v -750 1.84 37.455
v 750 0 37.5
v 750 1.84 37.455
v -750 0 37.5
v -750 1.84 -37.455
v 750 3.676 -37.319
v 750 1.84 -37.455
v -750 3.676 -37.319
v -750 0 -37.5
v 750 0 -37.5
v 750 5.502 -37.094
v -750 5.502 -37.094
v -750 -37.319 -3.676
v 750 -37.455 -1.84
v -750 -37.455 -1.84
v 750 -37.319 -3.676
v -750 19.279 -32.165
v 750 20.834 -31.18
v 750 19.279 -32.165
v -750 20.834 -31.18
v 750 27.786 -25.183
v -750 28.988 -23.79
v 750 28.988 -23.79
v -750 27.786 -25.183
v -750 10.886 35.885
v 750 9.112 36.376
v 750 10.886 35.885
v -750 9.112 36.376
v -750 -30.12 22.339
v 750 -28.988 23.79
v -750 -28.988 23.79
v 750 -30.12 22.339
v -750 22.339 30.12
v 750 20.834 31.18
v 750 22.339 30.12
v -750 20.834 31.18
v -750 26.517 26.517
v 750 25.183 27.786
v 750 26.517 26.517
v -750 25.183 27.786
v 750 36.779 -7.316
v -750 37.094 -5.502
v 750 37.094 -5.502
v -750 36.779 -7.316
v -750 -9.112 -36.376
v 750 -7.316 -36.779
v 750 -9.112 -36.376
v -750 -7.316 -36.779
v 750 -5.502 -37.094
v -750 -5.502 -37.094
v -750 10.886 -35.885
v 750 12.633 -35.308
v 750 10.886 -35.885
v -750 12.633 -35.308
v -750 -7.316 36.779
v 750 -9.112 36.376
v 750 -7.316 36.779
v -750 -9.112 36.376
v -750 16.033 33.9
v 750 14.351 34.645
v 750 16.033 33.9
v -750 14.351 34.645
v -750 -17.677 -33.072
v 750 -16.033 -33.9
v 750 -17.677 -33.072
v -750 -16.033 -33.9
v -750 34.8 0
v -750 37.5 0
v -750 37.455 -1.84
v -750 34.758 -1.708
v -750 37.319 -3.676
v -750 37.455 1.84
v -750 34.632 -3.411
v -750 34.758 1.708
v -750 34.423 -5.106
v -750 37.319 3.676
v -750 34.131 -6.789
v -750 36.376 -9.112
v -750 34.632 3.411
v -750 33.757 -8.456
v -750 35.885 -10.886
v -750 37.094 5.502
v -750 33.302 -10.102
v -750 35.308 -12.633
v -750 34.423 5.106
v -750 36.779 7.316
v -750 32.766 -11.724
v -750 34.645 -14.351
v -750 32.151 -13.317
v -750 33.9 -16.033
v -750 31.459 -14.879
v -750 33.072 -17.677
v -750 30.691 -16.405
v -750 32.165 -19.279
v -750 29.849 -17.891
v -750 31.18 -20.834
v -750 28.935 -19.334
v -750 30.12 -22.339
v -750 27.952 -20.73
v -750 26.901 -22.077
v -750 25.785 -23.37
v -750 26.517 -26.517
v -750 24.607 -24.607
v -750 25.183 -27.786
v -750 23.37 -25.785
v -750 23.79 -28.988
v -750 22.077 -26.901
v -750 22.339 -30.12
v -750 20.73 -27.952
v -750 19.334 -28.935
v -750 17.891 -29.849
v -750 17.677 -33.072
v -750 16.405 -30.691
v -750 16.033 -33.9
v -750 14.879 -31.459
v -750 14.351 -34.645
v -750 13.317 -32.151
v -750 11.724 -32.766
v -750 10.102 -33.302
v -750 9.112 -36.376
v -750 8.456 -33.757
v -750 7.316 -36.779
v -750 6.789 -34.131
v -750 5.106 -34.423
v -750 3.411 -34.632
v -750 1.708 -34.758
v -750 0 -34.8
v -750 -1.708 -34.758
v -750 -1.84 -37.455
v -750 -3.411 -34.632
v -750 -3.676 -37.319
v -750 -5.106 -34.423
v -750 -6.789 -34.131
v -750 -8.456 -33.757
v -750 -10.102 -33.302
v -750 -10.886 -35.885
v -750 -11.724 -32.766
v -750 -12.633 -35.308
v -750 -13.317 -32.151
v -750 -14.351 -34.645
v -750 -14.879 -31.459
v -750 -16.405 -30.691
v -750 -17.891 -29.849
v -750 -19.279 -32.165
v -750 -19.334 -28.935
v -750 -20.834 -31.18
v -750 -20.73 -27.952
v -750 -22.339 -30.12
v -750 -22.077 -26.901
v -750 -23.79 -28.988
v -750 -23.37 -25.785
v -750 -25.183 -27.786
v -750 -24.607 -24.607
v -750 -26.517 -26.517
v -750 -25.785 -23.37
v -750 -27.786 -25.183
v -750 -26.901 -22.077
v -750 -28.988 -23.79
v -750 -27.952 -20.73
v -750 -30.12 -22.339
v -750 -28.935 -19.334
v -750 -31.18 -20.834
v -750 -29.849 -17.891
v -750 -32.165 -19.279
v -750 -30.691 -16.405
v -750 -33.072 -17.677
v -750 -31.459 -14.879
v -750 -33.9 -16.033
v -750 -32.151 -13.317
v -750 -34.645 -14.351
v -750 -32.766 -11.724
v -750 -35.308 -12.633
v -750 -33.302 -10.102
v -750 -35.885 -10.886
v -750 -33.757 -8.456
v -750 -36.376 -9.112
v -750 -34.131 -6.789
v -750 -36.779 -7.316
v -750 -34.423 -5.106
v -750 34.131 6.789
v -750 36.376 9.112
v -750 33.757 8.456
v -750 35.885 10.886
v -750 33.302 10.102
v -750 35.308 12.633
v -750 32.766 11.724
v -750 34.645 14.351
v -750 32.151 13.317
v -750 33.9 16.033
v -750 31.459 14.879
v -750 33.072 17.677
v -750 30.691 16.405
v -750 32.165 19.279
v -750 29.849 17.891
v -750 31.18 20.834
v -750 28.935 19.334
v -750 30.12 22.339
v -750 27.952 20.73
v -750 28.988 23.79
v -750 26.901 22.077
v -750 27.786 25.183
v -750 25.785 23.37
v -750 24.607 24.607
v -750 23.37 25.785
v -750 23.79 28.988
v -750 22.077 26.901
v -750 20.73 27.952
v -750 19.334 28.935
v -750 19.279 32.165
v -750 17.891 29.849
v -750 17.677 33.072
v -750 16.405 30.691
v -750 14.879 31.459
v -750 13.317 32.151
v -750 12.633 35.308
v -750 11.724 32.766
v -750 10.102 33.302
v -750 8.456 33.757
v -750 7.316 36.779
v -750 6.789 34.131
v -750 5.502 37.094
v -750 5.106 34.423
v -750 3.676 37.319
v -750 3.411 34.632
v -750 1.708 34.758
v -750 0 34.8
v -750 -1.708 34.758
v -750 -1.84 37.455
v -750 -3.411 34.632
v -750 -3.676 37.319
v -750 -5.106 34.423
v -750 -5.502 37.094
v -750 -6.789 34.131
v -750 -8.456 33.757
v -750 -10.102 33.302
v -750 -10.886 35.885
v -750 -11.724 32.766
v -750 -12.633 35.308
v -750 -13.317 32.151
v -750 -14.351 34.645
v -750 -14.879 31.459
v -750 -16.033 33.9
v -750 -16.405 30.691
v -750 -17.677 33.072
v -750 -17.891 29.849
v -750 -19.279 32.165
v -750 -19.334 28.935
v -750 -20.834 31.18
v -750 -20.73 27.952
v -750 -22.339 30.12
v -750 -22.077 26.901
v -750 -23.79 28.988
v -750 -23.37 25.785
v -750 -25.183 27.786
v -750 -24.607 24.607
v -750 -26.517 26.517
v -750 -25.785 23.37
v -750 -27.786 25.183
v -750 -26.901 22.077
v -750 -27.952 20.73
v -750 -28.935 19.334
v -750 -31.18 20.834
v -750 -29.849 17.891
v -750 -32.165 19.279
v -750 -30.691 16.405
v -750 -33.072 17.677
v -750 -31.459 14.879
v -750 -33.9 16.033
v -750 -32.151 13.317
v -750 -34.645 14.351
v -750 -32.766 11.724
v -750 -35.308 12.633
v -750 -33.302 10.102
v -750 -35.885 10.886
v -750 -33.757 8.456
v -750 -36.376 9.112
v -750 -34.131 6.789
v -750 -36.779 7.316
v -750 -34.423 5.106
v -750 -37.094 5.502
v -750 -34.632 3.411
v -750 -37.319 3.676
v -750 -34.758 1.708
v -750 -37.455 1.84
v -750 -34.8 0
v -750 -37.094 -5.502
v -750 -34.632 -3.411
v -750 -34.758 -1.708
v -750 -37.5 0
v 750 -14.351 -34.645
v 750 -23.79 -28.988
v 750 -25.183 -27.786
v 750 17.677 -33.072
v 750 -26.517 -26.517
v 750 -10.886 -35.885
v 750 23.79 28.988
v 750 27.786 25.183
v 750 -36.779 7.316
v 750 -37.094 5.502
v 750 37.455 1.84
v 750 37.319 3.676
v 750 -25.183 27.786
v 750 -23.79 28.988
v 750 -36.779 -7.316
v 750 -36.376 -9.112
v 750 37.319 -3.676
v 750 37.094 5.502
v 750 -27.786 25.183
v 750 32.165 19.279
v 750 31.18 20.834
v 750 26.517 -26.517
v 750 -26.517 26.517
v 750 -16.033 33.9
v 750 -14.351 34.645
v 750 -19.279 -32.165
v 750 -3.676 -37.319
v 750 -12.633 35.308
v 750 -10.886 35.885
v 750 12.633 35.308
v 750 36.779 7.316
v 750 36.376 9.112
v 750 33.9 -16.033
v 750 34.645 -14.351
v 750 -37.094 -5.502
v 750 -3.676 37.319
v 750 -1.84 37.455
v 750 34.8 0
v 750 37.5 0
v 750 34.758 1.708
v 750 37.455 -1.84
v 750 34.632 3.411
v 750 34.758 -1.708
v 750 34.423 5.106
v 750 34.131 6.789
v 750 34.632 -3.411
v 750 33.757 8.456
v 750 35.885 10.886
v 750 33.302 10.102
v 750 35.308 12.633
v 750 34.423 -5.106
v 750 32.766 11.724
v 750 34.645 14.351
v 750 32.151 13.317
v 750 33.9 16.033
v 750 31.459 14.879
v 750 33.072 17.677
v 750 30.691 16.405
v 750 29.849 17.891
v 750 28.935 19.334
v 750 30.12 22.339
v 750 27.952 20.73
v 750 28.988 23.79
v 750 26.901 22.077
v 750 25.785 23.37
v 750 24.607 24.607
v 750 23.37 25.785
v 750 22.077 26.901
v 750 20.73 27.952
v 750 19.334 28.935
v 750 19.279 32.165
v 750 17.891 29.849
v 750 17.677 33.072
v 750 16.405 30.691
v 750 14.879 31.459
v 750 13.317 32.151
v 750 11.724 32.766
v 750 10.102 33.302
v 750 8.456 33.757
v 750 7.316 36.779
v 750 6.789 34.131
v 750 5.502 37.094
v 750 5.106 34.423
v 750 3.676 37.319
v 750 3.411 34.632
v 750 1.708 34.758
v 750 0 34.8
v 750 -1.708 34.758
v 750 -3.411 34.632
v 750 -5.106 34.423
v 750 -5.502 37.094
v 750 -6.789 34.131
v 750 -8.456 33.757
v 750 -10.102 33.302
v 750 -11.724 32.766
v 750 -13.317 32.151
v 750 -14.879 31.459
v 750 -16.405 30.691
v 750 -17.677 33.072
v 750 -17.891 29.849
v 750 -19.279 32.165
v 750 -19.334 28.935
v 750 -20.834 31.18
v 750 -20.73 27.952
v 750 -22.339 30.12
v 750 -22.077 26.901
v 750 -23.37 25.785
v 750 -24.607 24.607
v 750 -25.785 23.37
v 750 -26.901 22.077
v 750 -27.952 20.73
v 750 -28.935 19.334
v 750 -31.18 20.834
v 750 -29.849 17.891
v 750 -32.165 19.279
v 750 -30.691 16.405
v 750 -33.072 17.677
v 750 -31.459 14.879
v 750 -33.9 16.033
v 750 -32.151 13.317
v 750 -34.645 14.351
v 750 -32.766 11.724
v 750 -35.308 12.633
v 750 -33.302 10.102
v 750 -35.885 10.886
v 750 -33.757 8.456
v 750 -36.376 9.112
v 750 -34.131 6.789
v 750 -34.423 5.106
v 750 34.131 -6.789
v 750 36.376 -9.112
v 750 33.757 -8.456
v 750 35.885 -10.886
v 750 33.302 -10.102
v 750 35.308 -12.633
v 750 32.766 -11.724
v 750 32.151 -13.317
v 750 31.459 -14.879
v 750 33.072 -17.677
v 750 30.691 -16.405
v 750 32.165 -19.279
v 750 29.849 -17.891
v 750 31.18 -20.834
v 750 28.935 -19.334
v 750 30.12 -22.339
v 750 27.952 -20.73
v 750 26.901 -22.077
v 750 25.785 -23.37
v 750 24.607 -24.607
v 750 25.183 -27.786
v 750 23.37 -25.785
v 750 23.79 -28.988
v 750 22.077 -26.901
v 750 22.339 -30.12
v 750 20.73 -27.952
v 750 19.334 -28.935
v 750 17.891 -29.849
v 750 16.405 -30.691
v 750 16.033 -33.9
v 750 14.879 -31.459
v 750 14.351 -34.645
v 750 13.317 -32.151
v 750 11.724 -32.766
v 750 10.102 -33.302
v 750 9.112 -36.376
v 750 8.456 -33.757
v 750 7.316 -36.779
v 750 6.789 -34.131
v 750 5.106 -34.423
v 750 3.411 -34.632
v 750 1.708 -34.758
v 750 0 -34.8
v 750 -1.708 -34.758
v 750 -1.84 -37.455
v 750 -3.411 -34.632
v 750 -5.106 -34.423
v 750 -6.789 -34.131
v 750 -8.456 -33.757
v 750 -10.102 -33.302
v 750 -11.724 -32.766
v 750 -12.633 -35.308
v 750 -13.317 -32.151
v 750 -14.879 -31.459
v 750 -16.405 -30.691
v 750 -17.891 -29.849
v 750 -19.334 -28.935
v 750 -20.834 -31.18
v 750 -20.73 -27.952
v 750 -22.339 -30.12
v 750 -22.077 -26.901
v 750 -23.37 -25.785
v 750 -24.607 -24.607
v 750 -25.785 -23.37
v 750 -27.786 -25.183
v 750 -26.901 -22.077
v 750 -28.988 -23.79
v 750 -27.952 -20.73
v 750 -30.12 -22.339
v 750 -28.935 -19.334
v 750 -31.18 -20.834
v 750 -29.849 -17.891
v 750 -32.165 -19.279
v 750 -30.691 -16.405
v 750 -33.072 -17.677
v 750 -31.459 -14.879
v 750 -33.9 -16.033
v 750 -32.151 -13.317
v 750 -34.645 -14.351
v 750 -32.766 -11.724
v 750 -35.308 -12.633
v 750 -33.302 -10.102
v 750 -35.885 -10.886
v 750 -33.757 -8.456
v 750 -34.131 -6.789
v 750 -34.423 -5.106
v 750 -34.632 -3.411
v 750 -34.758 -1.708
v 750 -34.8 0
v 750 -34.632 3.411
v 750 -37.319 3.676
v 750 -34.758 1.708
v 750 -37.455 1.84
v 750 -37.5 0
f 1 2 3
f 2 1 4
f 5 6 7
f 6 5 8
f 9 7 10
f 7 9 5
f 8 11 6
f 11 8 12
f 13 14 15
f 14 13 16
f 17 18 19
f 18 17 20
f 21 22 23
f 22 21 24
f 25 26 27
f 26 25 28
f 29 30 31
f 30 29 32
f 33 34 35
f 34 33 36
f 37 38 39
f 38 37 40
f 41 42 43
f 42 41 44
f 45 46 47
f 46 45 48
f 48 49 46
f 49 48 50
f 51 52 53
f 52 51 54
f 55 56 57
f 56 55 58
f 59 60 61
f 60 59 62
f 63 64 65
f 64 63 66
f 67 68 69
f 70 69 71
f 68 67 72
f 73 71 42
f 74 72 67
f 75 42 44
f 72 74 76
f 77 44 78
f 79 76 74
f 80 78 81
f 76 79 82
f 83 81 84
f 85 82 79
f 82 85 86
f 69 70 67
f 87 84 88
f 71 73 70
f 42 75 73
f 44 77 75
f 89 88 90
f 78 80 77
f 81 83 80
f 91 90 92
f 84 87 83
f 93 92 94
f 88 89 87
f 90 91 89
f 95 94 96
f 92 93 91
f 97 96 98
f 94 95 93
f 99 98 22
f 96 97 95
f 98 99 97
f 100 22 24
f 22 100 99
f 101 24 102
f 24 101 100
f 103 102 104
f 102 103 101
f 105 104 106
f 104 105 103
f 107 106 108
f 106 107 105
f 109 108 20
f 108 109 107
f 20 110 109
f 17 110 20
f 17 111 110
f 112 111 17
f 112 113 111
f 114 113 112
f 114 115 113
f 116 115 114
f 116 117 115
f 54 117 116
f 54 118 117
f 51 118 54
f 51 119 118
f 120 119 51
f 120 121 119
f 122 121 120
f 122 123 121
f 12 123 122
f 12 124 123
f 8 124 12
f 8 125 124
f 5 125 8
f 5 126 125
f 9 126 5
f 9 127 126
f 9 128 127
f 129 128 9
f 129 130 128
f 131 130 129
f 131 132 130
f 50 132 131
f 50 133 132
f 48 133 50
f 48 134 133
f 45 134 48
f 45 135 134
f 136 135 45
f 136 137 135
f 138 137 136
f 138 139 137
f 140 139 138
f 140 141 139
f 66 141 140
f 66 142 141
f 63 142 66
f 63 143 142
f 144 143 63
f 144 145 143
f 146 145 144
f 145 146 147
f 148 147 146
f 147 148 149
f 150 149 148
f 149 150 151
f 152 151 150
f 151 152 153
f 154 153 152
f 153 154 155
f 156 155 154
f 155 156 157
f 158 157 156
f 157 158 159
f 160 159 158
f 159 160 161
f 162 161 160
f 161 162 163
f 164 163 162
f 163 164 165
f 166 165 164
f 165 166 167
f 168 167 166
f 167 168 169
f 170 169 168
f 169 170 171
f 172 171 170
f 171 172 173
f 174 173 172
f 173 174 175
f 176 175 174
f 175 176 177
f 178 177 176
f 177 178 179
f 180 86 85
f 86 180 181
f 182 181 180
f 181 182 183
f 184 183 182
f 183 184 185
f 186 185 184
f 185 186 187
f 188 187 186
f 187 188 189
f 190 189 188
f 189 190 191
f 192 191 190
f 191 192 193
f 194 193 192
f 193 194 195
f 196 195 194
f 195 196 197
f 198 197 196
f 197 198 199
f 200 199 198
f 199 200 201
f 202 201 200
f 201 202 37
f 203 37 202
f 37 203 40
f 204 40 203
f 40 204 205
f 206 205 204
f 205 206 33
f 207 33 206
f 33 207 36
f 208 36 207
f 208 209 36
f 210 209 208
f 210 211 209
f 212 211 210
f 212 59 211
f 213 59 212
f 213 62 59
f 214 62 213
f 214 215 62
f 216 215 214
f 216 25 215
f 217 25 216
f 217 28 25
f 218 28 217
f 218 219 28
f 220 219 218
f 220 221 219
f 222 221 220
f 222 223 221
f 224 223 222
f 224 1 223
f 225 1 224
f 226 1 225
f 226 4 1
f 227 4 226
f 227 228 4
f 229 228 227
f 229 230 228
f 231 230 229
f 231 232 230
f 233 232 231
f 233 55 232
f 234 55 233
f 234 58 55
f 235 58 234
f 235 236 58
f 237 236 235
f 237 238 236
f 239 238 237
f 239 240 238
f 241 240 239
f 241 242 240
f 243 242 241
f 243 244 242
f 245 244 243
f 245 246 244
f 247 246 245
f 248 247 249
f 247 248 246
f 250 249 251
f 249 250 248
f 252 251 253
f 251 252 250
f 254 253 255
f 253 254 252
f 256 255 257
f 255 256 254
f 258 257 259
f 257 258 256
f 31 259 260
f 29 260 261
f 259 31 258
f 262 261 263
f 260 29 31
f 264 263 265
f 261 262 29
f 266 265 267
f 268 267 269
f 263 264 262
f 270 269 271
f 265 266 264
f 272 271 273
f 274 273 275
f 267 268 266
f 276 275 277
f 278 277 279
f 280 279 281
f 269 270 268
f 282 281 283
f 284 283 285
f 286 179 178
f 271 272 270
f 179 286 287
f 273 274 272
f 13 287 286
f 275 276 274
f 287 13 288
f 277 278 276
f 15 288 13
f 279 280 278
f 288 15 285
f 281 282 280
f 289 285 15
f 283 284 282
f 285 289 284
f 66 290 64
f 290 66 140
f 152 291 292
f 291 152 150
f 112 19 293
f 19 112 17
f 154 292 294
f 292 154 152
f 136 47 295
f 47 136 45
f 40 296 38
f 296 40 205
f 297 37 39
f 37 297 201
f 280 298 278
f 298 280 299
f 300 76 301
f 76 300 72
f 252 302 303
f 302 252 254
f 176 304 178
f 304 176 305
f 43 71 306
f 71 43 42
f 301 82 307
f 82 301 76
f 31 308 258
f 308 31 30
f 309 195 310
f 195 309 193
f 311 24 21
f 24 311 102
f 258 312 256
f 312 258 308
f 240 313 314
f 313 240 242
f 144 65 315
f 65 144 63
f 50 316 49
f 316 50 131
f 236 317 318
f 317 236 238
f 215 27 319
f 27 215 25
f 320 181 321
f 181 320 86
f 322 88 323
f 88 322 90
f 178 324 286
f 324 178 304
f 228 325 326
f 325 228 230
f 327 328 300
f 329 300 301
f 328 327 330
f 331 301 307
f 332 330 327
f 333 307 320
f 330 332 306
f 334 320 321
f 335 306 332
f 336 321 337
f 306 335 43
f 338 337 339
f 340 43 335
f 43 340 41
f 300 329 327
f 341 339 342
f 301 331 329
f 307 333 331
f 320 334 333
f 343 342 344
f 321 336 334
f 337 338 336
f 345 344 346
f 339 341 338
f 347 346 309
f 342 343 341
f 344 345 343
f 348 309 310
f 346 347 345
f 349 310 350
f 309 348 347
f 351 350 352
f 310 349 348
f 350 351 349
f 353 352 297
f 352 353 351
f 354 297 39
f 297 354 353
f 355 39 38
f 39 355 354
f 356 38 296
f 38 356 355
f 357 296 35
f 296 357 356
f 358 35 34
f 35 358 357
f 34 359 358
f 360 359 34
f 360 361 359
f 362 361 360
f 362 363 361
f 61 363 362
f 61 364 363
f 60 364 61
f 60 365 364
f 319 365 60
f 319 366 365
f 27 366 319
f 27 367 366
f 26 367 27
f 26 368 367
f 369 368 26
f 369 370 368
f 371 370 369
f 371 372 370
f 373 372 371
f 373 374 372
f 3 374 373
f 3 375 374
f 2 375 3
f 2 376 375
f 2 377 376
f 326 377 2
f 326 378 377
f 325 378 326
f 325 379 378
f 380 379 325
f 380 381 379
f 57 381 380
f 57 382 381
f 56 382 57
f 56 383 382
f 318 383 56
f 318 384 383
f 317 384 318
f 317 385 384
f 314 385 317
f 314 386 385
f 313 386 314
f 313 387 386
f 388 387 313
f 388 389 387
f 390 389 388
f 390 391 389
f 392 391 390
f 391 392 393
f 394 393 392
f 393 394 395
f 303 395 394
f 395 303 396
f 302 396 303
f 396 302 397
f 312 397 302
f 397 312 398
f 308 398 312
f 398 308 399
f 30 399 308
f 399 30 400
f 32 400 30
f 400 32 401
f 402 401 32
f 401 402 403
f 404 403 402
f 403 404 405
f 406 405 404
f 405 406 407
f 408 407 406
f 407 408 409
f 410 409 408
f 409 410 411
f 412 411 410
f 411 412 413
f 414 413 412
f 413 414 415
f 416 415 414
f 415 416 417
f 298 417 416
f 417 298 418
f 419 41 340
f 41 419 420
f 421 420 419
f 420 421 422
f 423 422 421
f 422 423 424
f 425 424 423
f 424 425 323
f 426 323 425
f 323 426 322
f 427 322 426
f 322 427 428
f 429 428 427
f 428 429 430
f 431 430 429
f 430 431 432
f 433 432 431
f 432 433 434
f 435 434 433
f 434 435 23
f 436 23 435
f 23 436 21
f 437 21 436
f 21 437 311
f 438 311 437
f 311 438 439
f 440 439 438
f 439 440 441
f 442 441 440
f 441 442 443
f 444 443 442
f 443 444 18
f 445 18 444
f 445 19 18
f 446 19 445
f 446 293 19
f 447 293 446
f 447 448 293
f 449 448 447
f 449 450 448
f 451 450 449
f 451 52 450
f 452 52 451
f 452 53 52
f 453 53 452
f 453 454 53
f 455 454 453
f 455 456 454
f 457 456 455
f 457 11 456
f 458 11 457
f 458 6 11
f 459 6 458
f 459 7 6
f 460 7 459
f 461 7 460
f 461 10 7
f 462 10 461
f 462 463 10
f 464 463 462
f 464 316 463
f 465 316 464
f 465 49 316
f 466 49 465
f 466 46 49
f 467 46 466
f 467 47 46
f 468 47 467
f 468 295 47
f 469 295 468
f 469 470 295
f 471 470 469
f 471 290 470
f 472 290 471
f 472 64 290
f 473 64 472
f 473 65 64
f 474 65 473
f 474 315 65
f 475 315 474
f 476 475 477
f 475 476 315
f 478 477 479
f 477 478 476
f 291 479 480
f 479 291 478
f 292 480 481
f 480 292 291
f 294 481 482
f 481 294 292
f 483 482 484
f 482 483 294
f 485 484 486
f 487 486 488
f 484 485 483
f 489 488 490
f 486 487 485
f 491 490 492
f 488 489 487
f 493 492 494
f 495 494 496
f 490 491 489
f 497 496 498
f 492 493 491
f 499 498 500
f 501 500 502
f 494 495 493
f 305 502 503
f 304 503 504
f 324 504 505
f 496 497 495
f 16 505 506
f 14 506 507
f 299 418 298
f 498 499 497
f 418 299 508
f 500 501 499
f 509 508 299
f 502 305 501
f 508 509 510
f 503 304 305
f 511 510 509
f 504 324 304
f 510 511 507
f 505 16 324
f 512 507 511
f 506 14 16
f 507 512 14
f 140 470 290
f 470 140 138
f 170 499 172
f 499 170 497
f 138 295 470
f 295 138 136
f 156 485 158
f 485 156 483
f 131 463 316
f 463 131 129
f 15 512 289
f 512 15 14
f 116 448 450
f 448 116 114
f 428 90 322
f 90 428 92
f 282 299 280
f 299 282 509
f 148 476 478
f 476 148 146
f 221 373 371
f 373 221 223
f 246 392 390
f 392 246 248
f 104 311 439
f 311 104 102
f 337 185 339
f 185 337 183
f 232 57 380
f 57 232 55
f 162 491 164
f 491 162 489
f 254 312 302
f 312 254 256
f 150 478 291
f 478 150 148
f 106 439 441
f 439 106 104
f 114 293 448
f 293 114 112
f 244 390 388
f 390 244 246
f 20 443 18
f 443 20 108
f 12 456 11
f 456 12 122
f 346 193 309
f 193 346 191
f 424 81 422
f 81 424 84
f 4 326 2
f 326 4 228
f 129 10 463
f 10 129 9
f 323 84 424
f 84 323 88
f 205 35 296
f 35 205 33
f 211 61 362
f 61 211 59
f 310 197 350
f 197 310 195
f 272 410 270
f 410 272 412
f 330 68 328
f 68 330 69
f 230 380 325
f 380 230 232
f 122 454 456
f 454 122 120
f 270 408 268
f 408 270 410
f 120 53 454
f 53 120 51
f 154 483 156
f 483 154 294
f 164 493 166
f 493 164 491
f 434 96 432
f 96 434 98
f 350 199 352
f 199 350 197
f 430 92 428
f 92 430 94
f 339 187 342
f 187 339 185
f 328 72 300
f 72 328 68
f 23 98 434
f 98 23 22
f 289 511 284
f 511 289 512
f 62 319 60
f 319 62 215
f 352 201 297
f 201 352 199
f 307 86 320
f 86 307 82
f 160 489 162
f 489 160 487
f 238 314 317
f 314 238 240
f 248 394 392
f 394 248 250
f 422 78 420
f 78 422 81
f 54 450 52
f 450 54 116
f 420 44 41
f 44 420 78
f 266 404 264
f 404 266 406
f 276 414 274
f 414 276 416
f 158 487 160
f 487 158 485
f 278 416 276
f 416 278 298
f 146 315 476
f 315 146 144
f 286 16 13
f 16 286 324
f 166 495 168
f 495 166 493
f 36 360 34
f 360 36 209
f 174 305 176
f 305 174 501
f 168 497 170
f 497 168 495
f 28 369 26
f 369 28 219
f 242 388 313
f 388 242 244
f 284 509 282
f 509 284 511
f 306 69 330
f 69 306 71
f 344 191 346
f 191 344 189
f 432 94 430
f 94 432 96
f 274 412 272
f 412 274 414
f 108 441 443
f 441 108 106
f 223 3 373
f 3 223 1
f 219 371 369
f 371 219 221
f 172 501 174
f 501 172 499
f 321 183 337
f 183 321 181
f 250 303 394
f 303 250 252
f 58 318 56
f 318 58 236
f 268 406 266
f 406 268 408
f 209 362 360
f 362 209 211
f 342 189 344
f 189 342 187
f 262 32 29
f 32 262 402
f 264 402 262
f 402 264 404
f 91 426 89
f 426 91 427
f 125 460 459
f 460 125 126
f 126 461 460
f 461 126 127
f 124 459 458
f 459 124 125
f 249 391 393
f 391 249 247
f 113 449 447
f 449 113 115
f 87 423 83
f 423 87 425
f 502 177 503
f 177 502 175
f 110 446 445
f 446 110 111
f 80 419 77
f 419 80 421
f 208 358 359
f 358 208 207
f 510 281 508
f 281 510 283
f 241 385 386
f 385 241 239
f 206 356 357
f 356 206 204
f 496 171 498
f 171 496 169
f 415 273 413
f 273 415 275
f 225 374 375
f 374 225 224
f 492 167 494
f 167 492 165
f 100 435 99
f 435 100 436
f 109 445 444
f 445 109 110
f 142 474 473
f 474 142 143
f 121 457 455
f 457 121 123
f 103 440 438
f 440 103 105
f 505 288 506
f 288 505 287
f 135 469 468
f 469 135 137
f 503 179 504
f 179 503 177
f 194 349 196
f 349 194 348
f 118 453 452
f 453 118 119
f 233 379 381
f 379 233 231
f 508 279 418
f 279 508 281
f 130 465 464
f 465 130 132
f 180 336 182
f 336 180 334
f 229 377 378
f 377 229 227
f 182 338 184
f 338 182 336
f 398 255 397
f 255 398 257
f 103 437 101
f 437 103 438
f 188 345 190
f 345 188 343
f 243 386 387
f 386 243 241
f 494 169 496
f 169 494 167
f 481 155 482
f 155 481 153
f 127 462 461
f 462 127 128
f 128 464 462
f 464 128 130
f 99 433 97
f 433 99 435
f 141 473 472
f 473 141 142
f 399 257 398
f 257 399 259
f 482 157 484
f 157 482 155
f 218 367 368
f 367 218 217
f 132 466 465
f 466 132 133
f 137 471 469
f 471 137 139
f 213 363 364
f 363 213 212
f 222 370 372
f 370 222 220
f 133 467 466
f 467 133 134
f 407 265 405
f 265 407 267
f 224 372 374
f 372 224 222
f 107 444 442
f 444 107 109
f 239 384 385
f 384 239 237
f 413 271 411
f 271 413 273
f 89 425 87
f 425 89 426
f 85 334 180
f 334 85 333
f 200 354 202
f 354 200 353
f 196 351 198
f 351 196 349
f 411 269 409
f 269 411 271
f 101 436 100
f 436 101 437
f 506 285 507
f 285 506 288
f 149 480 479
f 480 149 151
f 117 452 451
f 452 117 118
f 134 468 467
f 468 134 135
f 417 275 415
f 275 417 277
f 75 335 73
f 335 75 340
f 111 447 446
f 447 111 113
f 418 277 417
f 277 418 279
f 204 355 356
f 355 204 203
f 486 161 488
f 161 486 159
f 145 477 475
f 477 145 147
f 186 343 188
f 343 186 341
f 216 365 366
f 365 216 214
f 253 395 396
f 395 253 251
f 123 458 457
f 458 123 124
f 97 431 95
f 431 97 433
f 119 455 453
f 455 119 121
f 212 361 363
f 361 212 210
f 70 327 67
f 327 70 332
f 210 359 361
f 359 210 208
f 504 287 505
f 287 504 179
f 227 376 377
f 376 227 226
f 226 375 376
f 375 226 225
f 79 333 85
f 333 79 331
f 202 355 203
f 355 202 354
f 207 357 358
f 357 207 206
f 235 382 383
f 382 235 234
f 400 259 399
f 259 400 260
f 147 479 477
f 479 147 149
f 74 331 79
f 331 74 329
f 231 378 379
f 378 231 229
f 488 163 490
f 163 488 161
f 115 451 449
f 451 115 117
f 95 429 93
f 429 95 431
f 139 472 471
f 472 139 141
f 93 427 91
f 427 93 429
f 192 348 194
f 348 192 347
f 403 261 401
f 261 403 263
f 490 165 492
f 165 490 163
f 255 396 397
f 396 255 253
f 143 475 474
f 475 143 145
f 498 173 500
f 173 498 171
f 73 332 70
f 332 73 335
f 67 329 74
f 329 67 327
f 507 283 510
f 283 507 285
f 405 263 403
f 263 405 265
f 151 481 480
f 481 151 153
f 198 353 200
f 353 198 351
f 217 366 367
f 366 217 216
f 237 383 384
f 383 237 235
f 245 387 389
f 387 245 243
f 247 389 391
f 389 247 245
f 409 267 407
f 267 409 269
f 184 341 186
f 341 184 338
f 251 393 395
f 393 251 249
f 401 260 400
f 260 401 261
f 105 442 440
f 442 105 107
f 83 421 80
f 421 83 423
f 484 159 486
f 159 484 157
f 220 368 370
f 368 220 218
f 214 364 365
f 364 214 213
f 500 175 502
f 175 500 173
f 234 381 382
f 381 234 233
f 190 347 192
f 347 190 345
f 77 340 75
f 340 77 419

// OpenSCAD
$fn = 128;

// HT 75 pipe, length 1500 mm
// Assumptions (typical HT DN75): OD = 75 mm, wall thickness = 2.7 mm

od  = 75;
t   = 2.7;
len = 1500;

id = od - 2*t;

module ht_pipe(od, id, len) {
    eps = 0.2; // small overlap to avoid coplanar faces

    // Orient pipe along X so FRONT/BACK/LEFT/RIGHT orthographic views show the 1500 mm length
    rotate([0, 90, 0])
        difference() {
            cylinder(h = len, d = od, center = true);
            cylinder(h = len + 2*eps, d = id, center = true);
        }
}

ht_pipe(od, id, len);
